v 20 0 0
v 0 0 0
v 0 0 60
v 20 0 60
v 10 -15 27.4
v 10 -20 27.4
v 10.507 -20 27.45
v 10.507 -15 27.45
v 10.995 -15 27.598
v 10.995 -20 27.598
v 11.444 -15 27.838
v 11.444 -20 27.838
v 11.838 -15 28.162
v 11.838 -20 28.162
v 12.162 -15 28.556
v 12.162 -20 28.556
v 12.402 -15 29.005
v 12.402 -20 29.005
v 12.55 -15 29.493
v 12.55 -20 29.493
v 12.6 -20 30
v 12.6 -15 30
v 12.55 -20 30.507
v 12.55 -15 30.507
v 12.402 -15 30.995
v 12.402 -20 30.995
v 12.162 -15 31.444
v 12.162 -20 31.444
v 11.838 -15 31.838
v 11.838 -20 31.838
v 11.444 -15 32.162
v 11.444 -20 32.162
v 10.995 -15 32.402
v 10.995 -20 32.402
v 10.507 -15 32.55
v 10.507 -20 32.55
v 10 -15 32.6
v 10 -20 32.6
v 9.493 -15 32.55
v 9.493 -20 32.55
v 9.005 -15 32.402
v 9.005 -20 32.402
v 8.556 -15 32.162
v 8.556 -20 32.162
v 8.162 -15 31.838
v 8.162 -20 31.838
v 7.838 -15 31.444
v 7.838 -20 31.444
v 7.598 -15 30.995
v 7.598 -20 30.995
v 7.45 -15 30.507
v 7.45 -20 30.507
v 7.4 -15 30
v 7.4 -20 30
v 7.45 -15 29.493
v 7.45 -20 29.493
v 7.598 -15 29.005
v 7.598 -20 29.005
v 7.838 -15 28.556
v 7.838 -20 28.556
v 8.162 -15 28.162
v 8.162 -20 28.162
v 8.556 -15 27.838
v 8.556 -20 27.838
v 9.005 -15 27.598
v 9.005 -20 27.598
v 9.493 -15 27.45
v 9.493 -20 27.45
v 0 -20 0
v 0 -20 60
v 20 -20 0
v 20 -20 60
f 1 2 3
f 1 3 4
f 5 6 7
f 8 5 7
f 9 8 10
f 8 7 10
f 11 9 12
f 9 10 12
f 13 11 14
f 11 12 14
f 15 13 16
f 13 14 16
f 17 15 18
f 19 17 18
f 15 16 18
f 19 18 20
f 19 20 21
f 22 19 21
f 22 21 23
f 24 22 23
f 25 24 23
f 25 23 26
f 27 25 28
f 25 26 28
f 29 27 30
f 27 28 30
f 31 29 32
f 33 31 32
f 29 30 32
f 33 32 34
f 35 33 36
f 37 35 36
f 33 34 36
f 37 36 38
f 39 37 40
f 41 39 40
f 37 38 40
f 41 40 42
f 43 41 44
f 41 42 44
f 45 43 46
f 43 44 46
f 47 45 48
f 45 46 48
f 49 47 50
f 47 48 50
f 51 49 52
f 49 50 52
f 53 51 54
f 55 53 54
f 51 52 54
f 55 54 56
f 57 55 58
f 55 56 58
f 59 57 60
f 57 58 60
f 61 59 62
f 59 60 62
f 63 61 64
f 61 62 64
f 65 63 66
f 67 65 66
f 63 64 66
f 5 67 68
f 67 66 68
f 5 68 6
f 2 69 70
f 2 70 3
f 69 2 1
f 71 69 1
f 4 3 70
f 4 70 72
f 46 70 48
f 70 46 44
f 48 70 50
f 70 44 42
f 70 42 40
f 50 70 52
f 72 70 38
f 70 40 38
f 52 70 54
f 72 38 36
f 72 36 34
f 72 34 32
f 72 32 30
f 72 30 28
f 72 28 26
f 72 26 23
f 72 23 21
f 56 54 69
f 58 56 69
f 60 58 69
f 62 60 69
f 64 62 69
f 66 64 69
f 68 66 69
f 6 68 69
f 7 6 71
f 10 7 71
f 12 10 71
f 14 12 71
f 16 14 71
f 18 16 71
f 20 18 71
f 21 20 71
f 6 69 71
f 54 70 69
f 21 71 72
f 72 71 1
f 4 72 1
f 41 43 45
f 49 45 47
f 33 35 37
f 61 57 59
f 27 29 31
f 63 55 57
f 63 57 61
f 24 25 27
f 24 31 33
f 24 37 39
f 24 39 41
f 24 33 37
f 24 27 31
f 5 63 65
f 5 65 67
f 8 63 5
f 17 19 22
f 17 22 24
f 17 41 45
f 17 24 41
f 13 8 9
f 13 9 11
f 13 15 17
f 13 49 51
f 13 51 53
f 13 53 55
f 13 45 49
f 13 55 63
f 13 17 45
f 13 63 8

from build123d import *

# Parameters (mm, degrees)
SKETCH1_W           = 20
SKETCH1_H           = 20
BOSS_EXTRUDE1_DEPTH = 60
SKETCH2_R           = 2.6
CUT_EXTRUDE1_DEPTH  = 5


with BuildPart() as part:
    # Sketch1 → Boss-Extrude1 (new body)
    with BuildSketch(Plane.XY):
        with Locations((10, -10)):
            Rectangle(SKETCH1_W, SKETCH1_H)
    extrude(amount=BOSS_EXTRUDE1_DEPTH)

    # Sketch2 → Cut-Extrude1 (cut)
    with BuildSketch(Plane.XZ.offset(20)):
        with Locations(Location((10, 30, 0), (0, 0, 270))):
            Circle(SKETCH2_R)
    extrude(amount=-CUT_EXTRUDE1_DEPTH, mode=Mode.SUBTRACT)


solid = part.part
